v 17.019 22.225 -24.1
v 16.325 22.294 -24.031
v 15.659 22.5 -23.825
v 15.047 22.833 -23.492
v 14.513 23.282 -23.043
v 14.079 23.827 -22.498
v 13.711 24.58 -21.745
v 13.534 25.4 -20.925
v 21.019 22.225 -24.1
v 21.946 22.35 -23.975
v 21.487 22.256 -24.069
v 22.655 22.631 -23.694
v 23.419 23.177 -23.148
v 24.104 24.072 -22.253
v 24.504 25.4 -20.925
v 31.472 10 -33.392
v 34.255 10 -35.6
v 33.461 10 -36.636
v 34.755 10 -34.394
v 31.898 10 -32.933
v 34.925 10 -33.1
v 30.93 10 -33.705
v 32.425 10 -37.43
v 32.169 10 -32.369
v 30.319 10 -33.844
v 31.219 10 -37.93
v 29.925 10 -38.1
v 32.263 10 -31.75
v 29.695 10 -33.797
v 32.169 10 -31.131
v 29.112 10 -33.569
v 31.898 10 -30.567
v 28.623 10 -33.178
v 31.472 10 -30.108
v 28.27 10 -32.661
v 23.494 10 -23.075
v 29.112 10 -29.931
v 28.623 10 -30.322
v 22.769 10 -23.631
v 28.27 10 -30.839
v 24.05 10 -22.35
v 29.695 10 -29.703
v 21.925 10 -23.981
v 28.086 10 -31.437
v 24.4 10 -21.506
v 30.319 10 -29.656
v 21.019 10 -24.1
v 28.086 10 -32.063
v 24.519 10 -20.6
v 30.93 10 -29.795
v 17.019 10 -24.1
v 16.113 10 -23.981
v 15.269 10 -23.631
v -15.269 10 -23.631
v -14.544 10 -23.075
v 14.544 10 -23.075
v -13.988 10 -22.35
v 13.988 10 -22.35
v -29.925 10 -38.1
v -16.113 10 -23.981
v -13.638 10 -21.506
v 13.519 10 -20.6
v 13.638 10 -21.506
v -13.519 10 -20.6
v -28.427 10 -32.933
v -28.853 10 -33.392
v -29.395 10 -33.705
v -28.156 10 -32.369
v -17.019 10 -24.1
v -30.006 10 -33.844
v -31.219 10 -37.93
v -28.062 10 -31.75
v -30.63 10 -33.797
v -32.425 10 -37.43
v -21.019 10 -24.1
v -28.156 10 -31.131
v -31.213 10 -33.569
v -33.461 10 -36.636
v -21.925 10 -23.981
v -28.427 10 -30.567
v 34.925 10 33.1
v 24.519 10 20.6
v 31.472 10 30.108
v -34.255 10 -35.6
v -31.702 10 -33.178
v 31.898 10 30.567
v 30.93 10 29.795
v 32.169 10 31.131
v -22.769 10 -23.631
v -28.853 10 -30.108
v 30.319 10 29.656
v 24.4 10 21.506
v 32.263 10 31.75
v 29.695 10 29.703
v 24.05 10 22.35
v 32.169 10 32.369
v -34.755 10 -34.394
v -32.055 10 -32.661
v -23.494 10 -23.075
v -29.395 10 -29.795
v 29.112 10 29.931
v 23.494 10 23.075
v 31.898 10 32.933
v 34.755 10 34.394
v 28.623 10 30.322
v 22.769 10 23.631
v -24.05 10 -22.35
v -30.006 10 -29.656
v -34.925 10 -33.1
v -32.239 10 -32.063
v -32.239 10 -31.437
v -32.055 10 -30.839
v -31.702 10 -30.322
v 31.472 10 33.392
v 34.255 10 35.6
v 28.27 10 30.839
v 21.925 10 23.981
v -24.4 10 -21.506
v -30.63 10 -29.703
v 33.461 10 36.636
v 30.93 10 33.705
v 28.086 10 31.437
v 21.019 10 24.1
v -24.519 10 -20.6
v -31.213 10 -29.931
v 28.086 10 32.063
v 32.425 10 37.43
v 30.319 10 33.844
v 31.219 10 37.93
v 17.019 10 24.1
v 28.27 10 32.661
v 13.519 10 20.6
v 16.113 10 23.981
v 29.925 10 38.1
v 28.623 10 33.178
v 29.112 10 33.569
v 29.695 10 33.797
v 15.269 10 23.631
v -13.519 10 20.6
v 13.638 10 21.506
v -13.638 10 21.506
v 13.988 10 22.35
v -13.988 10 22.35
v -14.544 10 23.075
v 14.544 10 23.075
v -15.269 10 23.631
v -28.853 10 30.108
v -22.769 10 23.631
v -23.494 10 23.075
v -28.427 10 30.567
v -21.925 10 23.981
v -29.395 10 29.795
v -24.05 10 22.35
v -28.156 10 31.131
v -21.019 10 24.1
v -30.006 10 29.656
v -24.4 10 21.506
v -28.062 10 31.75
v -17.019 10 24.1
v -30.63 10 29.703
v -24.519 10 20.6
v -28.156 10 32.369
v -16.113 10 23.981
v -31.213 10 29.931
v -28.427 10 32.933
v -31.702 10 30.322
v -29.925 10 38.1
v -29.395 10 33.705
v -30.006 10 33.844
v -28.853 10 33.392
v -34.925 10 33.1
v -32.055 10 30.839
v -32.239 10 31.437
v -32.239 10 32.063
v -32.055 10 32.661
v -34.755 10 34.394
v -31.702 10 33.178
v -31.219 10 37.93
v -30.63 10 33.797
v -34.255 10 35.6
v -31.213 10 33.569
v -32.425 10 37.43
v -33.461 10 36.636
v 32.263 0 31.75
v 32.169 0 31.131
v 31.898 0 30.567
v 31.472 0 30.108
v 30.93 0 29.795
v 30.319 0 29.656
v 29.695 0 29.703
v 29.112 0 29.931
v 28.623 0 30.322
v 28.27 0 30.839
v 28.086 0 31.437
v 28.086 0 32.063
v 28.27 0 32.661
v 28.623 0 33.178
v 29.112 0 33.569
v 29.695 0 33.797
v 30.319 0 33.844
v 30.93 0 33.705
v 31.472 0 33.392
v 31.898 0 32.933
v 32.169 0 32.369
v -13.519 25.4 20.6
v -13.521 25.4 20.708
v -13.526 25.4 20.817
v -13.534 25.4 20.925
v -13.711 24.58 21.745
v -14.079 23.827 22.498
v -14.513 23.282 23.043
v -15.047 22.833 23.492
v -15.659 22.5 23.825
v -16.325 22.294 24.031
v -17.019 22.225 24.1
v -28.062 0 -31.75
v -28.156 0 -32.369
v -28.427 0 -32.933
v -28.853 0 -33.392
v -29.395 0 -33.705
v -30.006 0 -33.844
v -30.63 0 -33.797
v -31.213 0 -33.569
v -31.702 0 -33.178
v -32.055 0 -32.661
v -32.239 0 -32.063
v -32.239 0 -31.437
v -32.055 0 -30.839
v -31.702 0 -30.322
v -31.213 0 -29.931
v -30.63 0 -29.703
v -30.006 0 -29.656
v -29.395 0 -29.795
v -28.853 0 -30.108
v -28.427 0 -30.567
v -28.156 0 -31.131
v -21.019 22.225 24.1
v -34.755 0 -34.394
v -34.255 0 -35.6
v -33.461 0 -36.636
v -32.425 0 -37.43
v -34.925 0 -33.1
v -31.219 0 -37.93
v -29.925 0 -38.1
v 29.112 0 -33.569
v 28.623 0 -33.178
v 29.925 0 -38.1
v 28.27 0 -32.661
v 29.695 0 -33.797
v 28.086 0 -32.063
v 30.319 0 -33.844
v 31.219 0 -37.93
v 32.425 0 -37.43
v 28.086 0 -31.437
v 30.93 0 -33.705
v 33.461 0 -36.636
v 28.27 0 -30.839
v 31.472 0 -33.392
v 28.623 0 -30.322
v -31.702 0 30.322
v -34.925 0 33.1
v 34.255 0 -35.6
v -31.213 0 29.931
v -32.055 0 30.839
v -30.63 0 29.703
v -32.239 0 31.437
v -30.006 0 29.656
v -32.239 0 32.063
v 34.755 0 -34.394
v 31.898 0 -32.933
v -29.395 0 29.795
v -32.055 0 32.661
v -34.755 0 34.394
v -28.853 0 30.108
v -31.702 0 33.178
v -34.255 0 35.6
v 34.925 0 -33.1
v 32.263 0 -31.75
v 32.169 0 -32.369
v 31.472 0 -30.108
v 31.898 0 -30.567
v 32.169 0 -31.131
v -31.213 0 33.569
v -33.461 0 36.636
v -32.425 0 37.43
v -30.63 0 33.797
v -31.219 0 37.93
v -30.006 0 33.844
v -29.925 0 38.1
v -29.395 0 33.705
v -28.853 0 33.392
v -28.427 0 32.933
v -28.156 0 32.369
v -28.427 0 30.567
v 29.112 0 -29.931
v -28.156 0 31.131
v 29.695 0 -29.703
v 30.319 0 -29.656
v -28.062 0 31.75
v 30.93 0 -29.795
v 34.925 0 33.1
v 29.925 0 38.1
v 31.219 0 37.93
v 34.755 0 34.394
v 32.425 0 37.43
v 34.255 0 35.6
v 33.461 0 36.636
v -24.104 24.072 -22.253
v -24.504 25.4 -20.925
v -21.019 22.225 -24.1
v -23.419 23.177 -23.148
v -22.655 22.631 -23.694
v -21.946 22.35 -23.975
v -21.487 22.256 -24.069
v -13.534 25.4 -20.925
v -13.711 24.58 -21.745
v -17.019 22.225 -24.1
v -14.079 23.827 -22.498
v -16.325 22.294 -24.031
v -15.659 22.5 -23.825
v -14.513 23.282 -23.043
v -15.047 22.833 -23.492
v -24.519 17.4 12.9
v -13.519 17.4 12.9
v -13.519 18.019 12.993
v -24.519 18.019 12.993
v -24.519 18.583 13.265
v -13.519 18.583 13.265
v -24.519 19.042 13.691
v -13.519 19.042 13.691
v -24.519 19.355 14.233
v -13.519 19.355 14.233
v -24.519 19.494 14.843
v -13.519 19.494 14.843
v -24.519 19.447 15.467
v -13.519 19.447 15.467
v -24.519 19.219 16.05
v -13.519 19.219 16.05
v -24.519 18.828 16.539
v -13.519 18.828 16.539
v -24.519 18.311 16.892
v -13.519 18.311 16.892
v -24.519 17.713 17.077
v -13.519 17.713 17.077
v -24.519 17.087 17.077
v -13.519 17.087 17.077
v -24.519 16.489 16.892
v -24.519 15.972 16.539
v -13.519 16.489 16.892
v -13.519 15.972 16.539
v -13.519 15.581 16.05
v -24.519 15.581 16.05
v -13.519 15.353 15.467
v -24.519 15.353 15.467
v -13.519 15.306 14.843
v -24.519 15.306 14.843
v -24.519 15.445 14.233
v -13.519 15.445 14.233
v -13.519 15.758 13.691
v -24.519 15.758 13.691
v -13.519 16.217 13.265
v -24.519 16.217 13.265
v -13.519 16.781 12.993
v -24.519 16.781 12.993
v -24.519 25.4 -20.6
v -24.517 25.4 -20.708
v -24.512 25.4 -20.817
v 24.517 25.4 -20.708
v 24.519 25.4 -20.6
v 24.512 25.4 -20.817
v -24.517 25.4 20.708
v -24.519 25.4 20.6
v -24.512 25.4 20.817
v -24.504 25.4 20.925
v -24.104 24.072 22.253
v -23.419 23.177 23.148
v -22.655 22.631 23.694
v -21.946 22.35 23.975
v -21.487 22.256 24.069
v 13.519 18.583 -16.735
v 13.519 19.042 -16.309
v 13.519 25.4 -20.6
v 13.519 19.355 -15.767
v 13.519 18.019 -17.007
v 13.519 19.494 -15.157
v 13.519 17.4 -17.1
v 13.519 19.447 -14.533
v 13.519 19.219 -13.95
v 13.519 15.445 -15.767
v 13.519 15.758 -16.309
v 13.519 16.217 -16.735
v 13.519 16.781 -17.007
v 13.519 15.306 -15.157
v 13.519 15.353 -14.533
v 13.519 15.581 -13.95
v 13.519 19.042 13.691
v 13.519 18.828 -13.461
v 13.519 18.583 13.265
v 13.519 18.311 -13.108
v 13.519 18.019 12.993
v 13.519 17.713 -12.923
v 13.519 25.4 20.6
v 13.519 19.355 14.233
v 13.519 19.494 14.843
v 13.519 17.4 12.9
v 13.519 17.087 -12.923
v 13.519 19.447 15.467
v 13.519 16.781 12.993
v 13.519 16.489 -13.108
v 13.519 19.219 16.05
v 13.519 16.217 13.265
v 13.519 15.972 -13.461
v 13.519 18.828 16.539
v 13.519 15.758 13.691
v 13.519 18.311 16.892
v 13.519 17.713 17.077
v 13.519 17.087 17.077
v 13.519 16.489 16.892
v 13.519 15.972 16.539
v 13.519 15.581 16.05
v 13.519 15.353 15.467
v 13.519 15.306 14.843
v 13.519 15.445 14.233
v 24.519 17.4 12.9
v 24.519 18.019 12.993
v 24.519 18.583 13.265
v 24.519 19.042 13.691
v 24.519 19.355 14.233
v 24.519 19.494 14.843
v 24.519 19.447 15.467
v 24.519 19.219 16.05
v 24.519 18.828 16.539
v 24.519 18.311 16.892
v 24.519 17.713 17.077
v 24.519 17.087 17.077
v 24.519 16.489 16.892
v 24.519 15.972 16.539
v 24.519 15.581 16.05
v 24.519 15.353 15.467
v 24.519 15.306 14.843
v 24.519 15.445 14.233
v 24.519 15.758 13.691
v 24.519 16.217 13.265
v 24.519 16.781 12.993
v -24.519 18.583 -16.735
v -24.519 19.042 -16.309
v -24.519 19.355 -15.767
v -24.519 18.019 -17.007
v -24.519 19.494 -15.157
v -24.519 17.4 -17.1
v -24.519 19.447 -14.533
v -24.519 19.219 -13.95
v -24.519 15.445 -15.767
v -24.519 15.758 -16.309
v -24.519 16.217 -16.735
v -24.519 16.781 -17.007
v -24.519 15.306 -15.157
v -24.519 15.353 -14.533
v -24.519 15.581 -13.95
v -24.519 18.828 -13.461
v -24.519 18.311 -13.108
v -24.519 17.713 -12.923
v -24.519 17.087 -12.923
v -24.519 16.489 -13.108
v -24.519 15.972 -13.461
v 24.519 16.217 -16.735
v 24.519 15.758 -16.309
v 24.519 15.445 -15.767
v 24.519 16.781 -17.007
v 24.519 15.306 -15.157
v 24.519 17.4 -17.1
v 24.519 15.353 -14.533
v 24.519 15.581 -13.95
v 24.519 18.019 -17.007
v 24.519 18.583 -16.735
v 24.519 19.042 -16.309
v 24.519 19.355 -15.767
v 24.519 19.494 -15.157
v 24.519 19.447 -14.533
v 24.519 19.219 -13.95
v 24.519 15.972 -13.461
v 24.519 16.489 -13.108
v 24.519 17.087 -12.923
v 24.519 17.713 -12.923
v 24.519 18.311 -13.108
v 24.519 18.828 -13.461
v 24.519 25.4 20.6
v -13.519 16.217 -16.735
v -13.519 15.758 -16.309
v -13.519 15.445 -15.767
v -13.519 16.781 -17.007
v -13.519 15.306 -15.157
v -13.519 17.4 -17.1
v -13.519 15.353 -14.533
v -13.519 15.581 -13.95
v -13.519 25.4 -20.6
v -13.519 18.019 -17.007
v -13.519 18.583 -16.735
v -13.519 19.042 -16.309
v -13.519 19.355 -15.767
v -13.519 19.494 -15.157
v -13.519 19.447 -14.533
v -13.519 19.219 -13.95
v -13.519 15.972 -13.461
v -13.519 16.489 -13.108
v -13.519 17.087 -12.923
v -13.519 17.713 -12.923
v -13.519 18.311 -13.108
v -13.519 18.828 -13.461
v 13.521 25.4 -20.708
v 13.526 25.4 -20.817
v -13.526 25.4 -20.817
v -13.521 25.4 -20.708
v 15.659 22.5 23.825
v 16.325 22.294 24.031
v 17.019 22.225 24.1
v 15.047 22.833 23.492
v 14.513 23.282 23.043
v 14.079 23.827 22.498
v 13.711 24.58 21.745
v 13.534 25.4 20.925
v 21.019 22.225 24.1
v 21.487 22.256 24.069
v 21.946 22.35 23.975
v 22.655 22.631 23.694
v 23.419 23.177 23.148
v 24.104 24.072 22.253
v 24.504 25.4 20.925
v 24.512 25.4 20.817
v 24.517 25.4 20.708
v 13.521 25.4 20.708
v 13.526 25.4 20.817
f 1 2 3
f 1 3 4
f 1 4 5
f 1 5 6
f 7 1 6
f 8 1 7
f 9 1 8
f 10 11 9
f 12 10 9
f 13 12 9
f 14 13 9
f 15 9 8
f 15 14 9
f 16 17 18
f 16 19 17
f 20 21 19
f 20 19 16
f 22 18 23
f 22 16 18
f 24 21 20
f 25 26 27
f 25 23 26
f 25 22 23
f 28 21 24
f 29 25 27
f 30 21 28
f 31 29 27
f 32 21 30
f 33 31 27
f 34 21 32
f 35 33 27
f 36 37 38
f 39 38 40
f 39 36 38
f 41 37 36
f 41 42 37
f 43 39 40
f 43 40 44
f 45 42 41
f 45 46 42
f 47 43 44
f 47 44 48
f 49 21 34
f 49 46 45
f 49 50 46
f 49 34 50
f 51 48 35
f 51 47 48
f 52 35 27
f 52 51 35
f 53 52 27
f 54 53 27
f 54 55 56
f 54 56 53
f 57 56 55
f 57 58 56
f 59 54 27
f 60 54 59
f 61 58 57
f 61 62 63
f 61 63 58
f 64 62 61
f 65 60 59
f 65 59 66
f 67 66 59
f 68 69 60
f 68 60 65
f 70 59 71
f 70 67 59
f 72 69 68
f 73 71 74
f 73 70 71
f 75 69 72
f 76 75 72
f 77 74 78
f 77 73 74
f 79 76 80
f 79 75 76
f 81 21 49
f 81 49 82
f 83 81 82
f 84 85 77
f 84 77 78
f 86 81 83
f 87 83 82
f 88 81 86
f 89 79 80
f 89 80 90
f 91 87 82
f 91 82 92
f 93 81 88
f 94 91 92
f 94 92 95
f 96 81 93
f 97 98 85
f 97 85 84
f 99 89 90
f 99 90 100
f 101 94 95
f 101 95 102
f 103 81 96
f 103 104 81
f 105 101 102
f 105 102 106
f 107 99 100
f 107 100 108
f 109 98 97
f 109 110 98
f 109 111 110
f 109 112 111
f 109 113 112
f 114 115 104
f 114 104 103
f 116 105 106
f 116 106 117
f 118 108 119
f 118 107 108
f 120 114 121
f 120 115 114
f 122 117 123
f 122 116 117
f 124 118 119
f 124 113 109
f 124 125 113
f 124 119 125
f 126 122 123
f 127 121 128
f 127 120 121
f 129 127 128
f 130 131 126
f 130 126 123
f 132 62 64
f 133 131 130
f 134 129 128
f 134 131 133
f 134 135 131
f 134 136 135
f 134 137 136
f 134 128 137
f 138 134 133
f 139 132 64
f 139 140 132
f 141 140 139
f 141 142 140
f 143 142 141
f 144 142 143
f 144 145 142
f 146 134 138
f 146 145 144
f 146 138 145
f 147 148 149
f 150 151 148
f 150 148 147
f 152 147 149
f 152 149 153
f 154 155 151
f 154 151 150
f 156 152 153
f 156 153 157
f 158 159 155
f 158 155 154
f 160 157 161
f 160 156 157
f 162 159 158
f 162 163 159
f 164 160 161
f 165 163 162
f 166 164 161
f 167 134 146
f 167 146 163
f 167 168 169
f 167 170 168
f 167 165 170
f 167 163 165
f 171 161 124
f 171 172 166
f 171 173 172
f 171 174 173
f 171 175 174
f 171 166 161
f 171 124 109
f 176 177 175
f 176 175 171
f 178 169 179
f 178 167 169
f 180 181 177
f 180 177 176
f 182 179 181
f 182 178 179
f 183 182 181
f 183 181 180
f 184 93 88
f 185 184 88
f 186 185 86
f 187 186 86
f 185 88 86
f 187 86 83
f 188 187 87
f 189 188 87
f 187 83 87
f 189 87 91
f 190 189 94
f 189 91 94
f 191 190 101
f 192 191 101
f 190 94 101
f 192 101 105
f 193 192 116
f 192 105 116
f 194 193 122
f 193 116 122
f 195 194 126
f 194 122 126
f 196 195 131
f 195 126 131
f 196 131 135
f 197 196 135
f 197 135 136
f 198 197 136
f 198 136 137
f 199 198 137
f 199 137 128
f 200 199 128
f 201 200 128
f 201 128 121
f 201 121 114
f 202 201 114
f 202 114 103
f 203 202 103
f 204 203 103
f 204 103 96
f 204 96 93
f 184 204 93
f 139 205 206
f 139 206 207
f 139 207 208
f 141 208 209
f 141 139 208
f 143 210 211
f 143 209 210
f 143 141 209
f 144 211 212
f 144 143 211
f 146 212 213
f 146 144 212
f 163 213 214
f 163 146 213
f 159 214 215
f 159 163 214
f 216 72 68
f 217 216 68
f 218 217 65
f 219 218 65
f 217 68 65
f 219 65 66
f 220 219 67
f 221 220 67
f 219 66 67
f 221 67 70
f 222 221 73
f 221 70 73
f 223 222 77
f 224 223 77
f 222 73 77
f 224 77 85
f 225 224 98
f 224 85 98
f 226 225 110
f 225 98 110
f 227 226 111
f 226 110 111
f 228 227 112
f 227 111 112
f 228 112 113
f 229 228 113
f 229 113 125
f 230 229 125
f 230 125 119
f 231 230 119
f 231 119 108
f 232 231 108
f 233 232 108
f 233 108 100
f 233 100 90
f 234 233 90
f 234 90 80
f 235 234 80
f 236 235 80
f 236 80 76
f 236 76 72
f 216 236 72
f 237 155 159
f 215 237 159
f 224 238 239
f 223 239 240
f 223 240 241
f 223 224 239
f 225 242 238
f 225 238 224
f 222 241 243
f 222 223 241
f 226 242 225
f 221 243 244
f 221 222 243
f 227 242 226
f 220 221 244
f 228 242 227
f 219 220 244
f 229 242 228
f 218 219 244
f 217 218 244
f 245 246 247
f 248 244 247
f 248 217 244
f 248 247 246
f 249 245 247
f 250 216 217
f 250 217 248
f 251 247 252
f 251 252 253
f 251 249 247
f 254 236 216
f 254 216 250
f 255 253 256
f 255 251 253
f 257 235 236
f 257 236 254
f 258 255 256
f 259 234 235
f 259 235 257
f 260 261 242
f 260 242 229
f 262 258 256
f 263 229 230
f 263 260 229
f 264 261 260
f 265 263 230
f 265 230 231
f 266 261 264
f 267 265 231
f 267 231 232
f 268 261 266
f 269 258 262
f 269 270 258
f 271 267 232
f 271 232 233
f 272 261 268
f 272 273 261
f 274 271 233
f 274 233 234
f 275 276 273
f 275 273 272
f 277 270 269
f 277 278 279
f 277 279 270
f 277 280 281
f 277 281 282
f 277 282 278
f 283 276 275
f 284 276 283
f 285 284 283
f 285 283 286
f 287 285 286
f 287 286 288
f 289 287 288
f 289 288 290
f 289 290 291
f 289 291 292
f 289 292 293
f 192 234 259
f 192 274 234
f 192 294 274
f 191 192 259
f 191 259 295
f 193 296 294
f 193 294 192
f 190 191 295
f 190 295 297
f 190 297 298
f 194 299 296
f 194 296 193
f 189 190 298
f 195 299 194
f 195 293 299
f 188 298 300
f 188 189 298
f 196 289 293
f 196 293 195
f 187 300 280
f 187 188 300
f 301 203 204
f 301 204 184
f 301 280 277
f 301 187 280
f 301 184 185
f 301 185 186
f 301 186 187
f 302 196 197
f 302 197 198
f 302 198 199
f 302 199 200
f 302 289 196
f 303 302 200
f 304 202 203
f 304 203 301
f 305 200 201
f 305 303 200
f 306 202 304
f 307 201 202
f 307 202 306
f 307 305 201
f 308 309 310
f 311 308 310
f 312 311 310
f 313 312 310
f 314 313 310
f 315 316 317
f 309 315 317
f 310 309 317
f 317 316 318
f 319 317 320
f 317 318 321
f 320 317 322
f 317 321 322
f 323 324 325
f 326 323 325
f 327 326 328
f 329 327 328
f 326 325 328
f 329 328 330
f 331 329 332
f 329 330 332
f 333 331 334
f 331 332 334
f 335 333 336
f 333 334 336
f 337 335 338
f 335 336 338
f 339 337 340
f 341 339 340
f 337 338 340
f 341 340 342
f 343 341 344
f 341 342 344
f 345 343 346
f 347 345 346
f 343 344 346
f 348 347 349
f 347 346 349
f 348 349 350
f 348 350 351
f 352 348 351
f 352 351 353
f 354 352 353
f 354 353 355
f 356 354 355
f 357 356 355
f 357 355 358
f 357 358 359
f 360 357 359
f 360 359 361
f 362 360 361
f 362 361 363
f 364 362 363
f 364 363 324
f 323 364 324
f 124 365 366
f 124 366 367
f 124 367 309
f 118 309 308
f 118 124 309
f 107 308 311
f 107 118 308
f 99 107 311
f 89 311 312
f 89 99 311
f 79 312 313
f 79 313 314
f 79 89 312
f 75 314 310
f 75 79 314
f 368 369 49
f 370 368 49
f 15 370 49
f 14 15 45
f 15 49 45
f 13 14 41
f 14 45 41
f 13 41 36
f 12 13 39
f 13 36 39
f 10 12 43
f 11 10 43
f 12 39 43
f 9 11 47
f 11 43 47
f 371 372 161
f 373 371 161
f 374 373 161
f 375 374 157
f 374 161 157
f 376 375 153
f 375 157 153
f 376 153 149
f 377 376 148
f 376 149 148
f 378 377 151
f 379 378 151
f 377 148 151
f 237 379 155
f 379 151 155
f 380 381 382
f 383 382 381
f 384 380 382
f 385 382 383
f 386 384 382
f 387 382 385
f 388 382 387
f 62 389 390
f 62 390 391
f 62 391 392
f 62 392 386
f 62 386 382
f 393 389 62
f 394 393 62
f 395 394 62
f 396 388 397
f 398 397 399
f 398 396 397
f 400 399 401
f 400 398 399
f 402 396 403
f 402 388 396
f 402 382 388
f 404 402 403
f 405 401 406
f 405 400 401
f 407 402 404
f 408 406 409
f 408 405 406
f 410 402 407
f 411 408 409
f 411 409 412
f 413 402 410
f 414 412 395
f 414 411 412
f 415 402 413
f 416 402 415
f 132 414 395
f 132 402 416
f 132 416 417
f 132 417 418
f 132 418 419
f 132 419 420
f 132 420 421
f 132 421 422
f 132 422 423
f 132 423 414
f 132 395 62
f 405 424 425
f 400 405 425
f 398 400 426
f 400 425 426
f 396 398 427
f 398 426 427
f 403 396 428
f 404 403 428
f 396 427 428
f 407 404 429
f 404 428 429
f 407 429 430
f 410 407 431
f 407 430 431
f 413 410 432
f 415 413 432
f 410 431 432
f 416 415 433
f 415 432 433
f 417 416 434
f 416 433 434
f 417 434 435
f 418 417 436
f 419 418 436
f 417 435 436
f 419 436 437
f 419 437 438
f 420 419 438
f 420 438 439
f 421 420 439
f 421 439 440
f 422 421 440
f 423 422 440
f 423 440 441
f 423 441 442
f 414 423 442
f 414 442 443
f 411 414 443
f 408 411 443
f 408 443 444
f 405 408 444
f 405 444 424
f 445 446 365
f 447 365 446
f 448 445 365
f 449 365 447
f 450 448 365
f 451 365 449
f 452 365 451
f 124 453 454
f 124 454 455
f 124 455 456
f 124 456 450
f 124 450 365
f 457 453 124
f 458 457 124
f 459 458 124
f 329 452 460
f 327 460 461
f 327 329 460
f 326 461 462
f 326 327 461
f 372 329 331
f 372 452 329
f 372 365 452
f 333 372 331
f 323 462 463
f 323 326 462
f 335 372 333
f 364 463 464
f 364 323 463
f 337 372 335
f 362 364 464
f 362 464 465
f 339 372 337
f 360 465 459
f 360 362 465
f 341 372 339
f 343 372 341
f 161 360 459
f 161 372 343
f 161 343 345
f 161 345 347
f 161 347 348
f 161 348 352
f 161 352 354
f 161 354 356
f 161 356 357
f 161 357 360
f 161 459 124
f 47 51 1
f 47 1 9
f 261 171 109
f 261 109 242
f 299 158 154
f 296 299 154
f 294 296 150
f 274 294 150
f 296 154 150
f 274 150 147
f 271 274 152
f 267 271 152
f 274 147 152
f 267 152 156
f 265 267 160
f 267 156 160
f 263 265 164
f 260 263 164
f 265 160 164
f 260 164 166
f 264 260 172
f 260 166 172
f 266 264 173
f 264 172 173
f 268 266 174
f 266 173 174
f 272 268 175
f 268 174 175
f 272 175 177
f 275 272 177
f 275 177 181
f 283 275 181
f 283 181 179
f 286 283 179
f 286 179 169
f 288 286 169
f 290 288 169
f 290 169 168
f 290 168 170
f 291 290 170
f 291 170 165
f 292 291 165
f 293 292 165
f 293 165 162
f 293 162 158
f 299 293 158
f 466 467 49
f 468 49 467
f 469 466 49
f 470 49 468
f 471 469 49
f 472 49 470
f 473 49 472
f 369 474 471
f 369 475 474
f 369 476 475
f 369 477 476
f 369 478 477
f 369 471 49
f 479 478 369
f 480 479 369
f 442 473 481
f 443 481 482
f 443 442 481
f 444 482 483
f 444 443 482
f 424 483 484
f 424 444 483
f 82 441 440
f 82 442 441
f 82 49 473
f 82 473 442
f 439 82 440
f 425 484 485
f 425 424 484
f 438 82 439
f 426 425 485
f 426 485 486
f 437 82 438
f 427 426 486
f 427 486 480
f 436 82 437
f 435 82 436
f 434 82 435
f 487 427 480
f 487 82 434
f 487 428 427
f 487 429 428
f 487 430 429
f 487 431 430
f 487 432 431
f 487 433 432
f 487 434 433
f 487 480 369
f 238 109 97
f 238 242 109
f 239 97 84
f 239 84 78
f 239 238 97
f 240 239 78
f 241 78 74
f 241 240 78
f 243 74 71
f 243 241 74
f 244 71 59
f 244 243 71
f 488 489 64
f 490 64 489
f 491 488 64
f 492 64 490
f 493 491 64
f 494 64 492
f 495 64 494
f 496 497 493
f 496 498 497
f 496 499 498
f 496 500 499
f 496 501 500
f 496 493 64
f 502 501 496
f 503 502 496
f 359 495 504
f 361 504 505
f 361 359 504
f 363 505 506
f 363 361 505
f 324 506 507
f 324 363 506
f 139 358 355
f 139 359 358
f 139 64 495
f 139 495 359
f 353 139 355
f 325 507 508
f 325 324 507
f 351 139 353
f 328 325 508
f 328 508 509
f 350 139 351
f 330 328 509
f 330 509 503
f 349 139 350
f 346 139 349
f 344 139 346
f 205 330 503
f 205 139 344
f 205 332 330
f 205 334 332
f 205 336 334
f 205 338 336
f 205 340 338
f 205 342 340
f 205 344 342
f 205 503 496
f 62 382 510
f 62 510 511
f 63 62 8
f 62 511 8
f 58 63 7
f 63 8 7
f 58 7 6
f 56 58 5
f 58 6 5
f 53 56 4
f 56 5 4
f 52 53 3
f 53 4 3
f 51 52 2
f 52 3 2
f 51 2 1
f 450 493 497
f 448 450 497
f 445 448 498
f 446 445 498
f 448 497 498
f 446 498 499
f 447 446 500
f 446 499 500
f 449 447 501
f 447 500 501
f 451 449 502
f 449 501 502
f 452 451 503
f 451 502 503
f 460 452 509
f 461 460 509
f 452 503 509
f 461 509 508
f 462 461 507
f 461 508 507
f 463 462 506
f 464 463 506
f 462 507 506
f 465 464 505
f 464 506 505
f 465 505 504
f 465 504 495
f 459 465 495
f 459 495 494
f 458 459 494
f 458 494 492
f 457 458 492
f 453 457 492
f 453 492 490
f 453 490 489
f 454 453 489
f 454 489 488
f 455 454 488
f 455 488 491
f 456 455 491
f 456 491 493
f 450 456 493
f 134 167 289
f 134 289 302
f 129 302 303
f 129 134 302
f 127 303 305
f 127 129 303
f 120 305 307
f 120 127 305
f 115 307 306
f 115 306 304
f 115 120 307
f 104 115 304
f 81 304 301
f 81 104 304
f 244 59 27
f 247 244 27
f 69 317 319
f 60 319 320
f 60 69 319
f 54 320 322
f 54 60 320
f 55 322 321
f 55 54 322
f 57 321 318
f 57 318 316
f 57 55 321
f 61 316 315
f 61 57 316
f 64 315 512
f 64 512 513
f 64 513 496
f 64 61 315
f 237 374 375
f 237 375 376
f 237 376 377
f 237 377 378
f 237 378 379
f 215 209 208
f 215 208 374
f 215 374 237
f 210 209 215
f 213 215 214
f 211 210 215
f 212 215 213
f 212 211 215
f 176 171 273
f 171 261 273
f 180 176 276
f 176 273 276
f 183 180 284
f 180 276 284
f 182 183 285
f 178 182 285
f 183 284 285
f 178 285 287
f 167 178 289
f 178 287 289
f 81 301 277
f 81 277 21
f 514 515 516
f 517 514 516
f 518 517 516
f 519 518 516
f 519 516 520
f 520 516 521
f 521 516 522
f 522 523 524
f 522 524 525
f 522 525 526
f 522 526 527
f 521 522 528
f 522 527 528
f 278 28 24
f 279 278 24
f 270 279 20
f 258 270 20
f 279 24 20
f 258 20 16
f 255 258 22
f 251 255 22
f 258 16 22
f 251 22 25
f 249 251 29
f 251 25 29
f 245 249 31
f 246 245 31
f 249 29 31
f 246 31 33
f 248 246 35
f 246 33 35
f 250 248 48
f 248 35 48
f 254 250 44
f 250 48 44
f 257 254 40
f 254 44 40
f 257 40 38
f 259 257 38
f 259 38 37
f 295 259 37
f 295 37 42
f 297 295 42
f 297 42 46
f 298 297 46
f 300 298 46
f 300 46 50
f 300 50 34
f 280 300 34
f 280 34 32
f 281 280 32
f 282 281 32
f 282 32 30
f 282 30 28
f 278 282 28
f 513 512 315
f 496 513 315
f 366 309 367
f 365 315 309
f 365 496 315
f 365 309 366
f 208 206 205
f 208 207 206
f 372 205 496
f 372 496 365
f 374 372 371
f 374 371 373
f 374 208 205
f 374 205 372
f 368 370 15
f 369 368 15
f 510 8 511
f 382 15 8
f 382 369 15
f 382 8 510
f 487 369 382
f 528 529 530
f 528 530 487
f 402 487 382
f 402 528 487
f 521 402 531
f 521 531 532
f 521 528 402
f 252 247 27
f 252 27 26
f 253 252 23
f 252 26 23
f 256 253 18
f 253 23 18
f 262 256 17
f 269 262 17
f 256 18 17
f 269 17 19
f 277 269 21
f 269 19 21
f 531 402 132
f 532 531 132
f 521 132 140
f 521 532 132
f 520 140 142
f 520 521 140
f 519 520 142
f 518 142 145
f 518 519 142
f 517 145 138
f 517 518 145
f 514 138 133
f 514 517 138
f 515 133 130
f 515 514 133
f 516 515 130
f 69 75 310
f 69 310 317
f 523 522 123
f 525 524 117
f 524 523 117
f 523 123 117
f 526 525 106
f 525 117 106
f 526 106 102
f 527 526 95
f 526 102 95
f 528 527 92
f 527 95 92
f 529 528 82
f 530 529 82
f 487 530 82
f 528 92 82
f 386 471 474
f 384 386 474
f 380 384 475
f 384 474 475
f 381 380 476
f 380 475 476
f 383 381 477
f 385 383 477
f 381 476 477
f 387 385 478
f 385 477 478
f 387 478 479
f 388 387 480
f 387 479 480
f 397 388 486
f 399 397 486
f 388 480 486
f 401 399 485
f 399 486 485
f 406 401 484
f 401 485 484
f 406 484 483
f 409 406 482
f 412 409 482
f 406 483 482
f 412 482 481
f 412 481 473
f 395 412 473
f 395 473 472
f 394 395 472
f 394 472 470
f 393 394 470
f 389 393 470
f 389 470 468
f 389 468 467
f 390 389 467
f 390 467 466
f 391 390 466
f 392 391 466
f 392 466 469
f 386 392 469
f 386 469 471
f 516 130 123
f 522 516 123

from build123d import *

# Parameters (mm, degrees)
BOSS_EXTRUDE1_DEPTH         = 38.1
SKETCH2_W                   = 49.038
SKETCH2_H                   = 14
CUT_EXTRUDE1_DEPTH          = 15.4
FILLET1_R                   = 3.5
TAP_DRILL_FOR_M5X0_8_TAP2_D = 4.2
TAP_DRILL_FOR_M5X0_8_TAP3_D = 4.2
CHAMFER1_SIZE               = 3.175
FILLET4_R                   = 5


with BuildPart() as part:
    # Sketch1 → Boss-Extrude1 (new, symmetric)
    with BuildSketch(Plane.XY):
        Polygon((-24.519, 25.4), (-24.519, 10), (-34.925, 10), (-34.925, 0), (34.925, 0), (34.925, 10), (24.519, 10), (24.519, 25.4), (13.519, 25.4), (13.519, 10), (-13.519, 10), (-13.519, 25.4), align=None)
    extrude(amount=BOSS_EXTRUDE1_DEPTH, both=True)

    # Sketch2 → Cut-Extrude1 (cut)
    with BuildSketch(Plane(origin=(0, 25.4, 0), x_dir=(1, 0, 0), z_dir=(0, 1, 0))):
        with Locations((0, 31.1)):
            Rectangle(SKETCH2_W, SKETCH2_H)
        with Locations((0, -31.1)):
            Rectangle(SKETCH2_W, SKETCH2_H)
    extrude(amount=-CUT_EXTRUDE1_DEPTH, mode=Mode.SUBTRACT)

    # Fillet1
    fillet1_edges = [part.edges().sort_by_distance(p)[0] for p in [
        (-13.519, 17.7, -24.1),
        (13.519, 17.7, -24.1),
        (24.519, 17.7, -24.1),
        (-24.519, 17.7, -24.1),
        (-13.519, 17.7, 24.1),
        (13.519, 17.7, 24.1),
        (-24.519, 17.7, 24.1),
        (24.519, 17.7, 24.1),
    ]]
    fillet(fillet1_edges, radius=FILLET1_R)

    # Tap Drill for M5x0.8 Tap2 (through all)
    with Locations(Plane(origin=(0, 0, 0), x_dir=(-1, 0, 0), z_dir=(0, -1, 0))):
        with Locations((-30.1625, 31.75), (30.1625, 31.75), (30.1625, -31.75), (-30.1625, -31.75)):
            Hole(TAP_DRILL_FOR_M5X0_8_TAP2_D / 2)

    # Tap Drill for M5x0.8 Tap3 (through all)
    with Locations(Plane.ZY.offset(24.519)):
        with Locations((-15, 17.4), (15, 17.4)):
            Hole(TAP_DRILL_FOR_M5X0_8_TAP3_D / 2)

    # Chamfer1
    # the kernel refuses this chamfer: 3.175 mm, written as the material it takes off along each edge
    with BuildSketch(Plane(origin=(29.184093487, 25.4, -24.1), x_dir=(0, -0.9996219169112968, -0.027495876610586726), z_dir=(-1, 0, 0)), Plane(origin=(-8.853906513, 25.4, 24.1), x_dir=(0, 0.027495876610586726, -0.9996219169112968), z_dir=(-1, 0, 0))) as chamfer1_piece_1:
        Polygon((CHAMFER1_SIZE * 0.999621916911, CHAMFER1_SIZE * 0.0274958766106), (-CHAMFER1_SIZE * 0.0274958766106, CHAMFER1_SIZE * 0.999621916911), (0, 0), align=None)
    extrude(amount=20.330186974, mode=Mode.SUBTRACT)
    with BuildSketch(Plane(origin=(29.184093487, 25.4, 24.1), x_dir=(0, -0.9996219169112968, 0.027495876610586726), z_dir=(-1, 0, 0)), Plane(origin=(-8.853906513, 25.4, -24.1), x_dir=(0, 0.027495876610586726, 0.9996219169112968), z_dir=(-1, 0, 0))) as chamfer1_piece_2:
        Polygon((CHAMFER1_SIZE * 0.999621916911, -CHAMFER1_SIZE * 0.0274958766106), (-CHAMFER1_SIZE * 0.0274958766106, -CHAMFER1_SIZE * 0.999621916911), (0, 0), align=None)
    extrude(amount=20.330186974, mode=Mode.SUBTRACT)

    # Fillet4
    fillet4_edges = [part.edges().sort_by_distance(p)[0] for p in [
        (-34.925, 5, 38.1),
        (34.925, 5, -38.1),
        (-34.925, 5, -38.1),
        (34.925, 5, 38.1),
    ]]
    fillet(fillet4_edges, radius=FILLET4_R)


solid = part.part
